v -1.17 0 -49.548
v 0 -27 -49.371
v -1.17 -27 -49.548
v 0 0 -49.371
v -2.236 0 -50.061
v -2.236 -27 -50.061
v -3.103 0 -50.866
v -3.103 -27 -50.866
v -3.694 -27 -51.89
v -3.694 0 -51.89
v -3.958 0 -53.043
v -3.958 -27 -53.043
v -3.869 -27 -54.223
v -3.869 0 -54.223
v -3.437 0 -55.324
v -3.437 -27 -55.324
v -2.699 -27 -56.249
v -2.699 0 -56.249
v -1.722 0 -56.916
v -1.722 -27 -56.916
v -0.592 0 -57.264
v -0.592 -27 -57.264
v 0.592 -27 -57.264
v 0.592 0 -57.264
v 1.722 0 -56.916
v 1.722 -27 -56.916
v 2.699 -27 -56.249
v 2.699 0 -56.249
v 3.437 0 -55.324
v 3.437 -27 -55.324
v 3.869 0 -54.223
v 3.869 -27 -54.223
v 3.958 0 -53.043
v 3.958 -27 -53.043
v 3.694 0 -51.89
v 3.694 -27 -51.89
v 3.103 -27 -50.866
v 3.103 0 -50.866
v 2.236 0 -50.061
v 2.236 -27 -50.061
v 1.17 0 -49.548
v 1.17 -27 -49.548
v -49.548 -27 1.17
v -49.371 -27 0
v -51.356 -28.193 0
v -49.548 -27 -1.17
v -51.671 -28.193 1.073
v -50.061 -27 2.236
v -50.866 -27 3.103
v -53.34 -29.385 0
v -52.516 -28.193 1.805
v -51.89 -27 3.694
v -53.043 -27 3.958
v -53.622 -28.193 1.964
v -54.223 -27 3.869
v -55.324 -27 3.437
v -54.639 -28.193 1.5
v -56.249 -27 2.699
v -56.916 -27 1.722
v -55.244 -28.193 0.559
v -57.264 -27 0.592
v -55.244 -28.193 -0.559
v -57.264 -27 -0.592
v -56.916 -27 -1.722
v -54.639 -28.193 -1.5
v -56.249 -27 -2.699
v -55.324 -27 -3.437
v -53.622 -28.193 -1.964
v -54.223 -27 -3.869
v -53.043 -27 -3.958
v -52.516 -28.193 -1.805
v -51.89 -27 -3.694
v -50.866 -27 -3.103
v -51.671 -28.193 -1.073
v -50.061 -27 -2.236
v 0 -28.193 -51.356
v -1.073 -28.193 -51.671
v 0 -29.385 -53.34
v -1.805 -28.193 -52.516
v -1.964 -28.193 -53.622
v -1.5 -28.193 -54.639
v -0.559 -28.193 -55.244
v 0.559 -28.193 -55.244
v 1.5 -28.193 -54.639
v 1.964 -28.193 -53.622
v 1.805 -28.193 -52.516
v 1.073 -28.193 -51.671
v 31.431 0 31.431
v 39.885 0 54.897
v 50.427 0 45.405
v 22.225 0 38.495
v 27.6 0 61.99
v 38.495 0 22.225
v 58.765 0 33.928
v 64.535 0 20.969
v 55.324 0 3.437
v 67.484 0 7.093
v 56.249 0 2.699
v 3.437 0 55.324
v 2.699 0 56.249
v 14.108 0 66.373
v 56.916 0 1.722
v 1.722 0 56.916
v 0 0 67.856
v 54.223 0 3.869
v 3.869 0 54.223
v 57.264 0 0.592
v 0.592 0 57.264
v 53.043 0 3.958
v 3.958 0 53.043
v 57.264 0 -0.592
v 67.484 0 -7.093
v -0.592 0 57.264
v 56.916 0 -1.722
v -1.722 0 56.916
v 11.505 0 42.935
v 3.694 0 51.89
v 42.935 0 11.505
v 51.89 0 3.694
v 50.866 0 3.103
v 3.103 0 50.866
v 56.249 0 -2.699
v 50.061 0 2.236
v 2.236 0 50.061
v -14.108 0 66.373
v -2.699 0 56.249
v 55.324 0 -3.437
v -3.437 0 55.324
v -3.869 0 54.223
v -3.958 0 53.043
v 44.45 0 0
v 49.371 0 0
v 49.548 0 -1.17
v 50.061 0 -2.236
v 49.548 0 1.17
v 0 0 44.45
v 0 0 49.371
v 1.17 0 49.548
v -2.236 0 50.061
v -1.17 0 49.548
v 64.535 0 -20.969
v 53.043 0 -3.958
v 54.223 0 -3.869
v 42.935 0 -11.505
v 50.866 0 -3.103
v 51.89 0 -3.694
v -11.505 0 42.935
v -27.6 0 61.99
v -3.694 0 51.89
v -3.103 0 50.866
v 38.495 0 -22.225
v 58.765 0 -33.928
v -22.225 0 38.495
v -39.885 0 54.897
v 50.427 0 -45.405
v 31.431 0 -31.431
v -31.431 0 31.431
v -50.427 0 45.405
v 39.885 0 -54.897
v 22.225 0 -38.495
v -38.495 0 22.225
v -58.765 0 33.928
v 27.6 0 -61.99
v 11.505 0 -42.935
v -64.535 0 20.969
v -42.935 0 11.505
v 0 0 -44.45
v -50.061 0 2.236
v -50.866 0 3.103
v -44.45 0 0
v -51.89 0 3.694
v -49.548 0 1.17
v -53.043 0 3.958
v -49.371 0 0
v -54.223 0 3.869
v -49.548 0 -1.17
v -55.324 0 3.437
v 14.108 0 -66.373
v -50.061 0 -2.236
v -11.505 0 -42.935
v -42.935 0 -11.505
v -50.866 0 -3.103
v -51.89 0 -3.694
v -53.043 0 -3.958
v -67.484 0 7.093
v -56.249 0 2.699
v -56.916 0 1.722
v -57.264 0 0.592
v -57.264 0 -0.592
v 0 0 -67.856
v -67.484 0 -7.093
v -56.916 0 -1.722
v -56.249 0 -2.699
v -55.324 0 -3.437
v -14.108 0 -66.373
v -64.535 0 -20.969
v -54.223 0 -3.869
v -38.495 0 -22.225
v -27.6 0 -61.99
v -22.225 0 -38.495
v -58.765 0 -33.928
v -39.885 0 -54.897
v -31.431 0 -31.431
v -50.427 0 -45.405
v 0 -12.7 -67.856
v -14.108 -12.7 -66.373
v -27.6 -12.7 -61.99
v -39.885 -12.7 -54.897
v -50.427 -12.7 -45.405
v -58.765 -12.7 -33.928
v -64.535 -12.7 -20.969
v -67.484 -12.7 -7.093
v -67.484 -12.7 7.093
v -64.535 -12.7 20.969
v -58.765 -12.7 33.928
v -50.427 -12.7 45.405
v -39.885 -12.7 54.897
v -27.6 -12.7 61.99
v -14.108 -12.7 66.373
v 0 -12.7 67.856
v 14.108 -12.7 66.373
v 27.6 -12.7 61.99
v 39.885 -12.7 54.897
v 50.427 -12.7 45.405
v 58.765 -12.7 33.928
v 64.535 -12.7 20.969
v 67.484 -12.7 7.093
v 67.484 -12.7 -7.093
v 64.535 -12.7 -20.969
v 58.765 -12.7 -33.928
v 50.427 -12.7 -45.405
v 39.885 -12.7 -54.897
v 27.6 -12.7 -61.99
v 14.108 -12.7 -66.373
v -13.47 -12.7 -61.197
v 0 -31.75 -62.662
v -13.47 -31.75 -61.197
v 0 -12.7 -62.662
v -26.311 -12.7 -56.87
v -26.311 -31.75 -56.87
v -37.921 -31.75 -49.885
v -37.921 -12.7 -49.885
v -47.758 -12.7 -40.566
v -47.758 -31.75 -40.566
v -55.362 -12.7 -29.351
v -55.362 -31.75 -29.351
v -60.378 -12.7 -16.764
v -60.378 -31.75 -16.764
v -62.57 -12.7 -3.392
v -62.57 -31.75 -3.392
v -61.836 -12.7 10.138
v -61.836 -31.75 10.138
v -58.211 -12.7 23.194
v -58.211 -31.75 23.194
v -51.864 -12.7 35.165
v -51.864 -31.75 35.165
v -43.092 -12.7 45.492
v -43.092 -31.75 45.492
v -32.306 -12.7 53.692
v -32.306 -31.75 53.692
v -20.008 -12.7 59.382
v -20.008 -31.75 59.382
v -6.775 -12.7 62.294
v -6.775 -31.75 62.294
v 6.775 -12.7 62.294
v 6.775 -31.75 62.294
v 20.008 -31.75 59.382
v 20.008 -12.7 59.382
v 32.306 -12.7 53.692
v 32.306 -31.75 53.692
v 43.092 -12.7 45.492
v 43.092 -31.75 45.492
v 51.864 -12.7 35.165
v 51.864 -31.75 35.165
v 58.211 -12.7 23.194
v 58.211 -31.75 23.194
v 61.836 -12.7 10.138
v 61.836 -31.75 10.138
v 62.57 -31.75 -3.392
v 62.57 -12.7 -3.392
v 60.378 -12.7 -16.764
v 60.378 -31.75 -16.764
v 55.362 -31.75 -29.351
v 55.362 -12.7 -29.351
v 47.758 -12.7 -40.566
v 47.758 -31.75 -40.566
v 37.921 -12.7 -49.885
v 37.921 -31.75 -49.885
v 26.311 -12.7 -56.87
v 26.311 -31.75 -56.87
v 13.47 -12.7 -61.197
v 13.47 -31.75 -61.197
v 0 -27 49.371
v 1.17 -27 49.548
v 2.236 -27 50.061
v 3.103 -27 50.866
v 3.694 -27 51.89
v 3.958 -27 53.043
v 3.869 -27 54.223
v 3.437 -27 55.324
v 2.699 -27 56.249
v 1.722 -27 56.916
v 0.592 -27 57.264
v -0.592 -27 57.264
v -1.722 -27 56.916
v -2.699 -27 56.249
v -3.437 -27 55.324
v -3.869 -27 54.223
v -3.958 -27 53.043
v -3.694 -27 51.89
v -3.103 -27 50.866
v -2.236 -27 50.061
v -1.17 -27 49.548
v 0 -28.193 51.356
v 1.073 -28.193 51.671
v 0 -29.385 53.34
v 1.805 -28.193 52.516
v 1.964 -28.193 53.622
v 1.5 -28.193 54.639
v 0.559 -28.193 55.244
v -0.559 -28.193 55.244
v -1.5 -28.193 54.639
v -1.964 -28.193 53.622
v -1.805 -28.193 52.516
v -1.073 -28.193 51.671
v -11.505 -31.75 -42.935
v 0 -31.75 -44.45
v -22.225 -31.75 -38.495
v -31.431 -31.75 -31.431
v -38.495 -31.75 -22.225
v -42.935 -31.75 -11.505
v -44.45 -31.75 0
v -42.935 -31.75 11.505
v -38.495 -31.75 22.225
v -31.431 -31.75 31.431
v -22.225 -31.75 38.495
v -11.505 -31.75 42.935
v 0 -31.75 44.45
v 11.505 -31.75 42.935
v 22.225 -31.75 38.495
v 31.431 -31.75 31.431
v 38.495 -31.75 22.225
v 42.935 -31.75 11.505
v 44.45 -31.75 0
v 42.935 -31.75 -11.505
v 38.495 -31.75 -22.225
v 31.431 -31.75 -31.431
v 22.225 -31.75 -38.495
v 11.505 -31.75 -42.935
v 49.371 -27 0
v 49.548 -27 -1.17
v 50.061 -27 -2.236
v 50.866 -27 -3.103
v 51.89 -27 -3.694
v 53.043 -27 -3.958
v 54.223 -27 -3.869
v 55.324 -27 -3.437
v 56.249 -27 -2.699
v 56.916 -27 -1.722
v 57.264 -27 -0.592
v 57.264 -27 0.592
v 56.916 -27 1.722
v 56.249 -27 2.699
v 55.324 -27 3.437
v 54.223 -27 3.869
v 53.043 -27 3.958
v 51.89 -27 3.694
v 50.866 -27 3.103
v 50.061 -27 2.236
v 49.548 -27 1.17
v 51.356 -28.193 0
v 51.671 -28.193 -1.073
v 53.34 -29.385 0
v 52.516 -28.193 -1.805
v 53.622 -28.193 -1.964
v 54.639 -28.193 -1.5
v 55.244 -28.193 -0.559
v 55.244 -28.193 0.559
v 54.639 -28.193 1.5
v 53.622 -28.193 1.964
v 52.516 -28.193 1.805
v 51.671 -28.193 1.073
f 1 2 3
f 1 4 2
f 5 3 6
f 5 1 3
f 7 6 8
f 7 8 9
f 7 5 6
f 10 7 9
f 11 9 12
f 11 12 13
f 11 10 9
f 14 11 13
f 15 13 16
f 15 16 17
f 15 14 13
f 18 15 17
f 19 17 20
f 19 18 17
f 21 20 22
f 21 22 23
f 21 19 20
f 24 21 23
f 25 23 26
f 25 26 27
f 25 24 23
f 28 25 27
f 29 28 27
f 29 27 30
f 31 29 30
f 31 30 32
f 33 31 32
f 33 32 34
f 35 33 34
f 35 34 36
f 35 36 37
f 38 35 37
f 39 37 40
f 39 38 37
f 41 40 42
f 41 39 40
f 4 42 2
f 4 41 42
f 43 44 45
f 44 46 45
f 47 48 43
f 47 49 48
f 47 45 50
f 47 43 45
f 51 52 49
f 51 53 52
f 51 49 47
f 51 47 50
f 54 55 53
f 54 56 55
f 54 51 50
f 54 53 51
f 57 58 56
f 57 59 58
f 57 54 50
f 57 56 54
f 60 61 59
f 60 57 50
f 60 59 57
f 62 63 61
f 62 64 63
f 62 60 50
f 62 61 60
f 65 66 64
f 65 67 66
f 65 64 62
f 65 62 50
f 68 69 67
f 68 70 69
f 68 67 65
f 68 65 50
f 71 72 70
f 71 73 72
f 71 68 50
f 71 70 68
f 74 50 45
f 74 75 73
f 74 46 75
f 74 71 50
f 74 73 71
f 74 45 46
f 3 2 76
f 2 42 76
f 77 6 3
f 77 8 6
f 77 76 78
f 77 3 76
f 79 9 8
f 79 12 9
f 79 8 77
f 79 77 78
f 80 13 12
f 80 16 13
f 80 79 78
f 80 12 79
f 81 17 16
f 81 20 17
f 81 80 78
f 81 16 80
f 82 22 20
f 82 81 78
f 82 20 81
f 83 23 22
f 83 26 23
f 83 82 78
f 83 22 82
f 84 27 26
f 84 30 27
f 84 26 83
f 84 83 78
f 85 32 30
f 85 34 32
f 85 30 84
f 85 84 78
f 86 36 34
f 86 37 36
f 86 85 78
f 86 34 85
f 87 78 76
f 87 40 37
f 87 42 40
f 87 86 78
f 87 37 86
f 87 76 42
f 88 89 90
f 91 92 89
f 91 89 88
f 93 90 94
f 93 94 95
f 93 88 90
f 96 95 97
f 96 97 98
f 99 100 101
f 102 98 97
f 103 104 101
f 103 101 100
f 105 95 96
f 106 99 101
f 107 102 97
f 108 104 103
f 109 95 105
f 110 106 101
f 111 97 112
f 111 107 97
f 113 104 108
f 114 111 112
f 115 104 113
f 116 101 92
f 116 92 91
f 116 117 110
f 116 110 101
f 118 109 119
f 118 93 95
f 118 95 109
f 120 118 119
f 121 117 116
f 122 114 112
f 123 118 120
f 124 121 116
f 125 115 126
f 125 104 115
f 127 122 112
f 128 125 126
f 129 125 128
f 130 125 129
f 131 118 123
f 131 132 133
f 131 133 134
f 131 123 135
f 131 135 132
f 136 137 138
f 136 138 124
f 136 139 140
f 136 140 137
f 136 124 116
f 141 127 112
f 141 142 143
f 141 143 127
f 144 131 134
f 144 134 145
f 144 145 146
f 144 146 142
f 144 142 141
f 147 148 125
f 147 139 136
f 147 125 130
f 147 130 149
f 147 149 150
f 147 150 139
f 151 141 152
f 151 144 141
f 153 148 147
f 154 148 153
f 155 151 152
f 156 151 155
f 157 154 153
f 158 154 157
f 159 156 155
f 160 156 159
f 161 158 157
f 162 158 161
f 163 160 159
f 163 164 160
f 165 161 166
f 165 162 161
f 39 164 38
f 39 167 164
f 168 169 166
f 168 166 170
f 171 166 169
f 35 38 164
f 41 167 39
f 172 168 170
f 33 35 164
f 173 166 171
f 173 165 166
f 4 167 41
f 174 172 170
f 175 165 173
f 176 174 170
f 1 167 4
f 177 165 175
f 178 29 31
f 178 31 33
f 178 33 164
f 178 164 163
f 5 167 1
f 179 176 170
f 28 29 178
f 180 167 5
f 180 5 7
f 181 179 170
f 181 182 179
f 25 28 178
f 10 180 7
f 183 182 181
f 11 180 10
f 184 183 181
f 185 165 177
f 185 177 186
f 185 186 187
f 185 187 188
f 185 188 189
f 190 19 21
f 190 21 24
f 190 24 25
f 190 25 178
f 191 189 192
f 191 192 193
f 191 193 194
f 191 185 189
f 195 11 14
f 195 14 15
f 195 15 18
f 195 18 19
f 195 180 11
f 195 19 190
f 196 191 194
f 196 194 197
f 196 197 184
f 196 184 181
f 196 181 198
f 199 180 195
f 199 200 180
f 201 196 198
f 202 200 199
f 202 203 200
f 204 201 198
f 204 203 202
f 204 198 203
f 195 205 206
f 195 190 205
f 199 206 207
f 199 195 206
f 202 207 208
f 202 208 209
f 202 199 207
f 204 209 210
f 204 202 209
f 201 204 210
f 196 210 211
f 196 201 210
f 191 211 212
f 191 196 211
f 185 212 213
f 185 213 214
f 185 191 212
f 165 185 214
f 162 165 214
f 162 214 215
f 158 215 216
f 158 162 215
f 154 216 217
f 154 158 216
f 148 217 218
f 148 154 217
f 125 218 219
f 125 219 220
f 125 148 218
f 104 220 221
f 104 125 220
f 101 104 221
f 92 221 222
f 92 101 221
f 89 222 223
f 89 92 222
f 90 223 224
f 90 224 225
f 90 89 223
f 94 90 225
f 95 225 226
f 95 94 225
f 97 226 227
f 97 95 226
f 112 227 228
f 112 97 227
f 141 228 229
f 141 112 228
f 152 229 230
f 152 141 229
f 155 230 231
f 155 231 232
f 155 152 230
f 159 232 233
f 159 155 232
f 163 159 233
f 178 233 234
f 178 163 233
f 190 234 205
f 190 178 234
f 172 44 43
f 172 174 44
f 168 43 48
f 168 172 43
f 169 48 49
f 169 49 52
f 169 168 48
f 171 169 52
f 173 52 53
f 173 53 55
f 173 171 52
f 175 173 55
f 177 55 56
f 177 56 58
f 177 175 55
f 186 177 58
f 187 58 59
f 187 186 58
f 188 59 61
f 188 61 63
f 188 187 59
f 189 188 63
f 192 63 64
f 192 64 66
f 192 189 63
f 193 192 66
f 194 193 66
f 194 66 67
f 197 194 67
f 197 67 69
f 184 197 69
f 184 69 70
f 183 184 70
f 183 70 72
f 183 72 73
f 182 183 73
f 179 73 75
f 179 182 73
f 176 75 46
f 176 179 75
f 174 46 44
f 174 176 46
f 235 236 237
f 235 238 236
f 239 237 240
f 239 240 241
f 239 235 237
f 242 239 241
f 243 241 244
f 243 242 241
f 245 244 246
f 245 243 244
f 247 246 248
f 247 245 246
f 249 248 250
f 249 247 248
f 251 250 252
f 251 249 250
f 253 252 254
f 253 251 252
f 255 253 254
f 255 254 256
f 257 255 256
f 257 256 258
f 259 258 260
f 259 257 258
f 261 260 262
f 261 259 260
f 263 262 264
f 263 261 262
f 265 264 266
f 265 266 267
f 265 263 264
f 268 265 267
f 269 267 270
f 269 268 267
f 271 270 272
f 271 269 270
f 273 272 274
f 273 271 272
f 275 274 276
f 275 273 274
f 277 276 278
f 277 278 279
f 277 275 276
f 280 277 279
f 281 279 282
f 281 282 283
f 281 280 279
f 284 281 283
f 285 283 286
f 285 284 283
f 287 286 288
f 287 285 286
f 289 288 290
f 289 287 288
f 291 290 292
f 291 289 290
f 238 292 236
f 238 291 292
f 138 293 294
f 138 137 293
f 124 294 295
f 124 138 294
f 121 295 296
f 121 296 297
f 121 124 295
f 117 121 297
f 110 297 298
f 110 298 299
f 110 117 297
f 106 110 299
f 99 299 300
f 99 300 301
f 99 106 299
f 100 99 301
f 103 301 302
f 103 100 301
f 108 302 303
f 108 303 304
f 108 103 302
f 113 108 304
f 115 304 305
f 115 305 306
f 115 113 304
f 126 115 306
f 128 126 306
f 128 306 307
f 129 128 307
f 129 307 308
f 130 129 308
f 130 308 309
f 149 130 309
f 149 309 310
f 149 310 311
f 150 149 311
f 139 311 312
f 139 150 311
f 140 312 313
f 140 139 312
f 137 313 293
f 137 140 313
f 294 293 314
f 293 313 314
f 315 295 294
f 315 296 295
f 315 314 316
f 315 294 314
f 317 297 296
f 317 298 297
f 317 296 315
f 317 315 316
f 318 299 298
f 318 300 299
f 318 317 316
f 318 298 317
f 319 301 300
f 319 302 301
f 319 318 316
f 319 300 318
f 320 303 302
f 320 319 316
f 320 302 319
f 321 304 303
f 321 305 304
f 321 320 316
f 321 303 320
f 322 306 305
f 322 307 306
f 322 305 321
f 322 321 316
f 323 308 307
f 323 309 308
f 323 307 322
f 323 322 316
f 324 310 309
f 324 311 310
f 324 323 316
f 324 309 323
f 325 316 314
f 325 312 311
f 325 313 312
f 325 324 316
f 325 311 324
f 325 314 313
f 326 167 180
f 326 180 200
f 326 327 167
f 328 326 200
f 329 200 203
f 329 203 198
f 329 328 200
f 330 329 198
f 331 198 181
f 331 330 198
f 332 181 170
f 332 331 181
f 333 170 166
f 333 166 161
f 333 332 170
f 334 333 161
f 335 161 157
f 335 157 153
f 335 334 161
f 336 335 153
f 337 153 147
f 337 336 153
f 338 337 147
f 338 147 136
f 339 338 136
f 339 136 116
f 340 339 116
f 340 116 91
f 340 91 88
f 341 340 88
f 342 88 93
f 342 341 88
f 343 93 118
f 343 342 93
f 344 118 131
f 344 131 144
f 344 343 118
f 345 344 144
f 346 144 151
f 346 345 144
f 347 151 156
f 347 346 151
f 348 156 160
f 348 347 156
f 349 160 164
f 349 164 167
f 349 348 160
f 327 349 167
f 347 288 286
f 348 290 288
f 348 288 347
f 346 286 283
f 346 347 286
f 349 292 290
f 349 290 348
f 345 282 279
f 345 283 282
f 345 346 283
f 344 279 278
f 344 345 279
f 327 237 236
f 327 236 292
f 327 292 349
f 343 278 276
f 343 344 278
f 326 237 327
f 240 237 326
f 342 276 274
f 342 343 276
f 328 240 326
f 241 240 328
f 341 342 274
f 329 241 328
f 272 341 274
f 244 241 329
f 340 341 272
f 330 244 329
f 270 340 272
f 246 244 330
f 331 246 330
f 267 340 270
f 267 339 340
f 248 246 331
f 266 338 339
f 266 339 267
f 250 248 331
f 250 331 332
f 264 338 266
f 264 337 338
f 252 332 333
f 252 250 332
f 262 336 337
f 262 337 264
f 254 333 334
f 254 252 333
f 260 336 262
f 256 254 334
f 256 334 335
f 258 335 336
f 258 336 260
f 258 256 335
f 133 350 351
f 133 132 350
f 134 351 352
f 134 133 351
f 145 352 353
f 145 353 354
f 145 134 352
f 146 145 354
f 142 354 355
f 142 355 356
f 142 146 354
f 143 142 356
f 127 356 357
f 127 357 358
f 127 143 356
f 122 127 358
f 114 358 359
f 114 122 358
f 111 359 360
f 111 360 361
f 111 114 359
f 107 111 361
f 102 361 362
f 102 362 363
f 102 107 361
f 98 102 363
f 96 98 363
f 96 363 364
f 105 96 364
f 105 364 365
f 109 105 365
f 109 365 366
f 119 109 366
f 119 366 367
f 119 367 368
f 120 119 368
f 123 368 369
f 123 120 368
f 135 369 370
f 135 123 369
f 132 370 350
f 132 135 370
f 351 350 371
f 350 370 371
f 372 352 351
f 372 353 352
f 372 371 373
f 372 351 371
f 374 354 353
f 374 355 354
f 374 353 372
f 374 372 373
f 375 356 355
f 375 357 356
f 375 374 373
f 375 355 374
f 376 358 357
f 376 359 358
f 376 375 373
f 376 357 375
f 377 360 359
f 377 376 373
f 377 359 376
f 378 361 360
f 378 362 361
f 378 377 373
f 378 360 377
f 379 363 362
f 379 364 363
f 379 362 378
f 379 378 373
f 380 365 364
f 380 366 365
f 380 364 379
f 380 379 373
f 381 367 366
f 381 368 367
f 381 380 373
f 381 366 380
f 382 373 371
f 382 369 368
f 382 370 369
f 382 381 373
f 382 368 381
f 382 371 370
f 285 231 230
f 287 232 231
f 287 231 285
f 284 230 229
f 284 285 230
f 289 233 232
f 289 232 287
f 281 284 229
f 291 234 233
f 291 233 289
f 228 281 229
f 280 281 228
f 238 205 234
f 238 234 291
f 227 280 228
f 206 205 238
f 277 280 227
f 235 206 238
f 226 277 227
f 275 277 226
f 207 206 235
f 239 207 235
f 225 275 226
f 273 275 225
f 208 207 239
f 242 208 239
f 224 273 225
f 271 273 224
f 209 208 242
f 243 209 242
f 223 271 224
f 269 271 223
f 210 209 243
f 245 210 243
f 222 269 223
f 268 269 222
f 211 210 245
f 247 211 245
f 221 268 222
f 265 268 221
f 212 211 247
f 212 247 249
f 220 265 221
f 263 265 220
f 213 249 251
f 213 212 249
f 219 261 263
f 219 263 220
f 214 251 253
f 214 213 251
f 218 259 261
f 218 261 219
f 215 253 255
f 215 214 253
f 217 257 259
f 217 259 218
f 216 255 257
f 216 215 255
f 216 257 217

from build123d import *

# Parameters (mm, degrees)
CIRPATTERN1_COUNT = 4


with BuildPart() as part:
    # Sketch1 → Revolve1 (revolve)
    with BuildSketch(Plane.XY, mode=Mode.PRIVATE) as revolve1_sk:
        Polygon((67.8561, 0), (44.45, 0), (44.45, -31.75), (62.6618, -31.75), (62.6618, -12.7), (67.8561, -12.7), align=None)
    revolve(revolve1_sk.sketch.rotate(Axis((0, -31.75, 0), (0, 1, 0)), 90), axis=Axis((0, -31.75, 0), (0, 1, 0)))

    # Sketch3 → 3/8-16 Tapped Hole1 (revolve, cut)
    with BuildSketch(Plane(origin=(0, 0, -53.34), x_dir=(0, 0, 1), z_dir=(1, 0, 0))):
        Polygon((0, 0), (0, 29.384865582), (3.96875, 27.0002), (3.96875, 0), align=None)
    f_3_8_16_tapped_hole1 = revolve(axis=Axis((0, 6.35, -53.34), (0, -1, 0)), mode=Mode.SUBTRACT)

    # CirPattern1: 3/8-16 Tapped Hole1 ×4 about axis
    cirpattern1_axis = Axis((0, 0, 0), (0, 1, 0))
    for i in range(1, CIRPATTERN1_COUNT):
        add(f_3_8_16_tapped_hole1.rotate(cirpattern1_axis, i * 360 / CIRPATTERN1_COUNT), mode=Mode.SUBTRACT)


solid = part.part
